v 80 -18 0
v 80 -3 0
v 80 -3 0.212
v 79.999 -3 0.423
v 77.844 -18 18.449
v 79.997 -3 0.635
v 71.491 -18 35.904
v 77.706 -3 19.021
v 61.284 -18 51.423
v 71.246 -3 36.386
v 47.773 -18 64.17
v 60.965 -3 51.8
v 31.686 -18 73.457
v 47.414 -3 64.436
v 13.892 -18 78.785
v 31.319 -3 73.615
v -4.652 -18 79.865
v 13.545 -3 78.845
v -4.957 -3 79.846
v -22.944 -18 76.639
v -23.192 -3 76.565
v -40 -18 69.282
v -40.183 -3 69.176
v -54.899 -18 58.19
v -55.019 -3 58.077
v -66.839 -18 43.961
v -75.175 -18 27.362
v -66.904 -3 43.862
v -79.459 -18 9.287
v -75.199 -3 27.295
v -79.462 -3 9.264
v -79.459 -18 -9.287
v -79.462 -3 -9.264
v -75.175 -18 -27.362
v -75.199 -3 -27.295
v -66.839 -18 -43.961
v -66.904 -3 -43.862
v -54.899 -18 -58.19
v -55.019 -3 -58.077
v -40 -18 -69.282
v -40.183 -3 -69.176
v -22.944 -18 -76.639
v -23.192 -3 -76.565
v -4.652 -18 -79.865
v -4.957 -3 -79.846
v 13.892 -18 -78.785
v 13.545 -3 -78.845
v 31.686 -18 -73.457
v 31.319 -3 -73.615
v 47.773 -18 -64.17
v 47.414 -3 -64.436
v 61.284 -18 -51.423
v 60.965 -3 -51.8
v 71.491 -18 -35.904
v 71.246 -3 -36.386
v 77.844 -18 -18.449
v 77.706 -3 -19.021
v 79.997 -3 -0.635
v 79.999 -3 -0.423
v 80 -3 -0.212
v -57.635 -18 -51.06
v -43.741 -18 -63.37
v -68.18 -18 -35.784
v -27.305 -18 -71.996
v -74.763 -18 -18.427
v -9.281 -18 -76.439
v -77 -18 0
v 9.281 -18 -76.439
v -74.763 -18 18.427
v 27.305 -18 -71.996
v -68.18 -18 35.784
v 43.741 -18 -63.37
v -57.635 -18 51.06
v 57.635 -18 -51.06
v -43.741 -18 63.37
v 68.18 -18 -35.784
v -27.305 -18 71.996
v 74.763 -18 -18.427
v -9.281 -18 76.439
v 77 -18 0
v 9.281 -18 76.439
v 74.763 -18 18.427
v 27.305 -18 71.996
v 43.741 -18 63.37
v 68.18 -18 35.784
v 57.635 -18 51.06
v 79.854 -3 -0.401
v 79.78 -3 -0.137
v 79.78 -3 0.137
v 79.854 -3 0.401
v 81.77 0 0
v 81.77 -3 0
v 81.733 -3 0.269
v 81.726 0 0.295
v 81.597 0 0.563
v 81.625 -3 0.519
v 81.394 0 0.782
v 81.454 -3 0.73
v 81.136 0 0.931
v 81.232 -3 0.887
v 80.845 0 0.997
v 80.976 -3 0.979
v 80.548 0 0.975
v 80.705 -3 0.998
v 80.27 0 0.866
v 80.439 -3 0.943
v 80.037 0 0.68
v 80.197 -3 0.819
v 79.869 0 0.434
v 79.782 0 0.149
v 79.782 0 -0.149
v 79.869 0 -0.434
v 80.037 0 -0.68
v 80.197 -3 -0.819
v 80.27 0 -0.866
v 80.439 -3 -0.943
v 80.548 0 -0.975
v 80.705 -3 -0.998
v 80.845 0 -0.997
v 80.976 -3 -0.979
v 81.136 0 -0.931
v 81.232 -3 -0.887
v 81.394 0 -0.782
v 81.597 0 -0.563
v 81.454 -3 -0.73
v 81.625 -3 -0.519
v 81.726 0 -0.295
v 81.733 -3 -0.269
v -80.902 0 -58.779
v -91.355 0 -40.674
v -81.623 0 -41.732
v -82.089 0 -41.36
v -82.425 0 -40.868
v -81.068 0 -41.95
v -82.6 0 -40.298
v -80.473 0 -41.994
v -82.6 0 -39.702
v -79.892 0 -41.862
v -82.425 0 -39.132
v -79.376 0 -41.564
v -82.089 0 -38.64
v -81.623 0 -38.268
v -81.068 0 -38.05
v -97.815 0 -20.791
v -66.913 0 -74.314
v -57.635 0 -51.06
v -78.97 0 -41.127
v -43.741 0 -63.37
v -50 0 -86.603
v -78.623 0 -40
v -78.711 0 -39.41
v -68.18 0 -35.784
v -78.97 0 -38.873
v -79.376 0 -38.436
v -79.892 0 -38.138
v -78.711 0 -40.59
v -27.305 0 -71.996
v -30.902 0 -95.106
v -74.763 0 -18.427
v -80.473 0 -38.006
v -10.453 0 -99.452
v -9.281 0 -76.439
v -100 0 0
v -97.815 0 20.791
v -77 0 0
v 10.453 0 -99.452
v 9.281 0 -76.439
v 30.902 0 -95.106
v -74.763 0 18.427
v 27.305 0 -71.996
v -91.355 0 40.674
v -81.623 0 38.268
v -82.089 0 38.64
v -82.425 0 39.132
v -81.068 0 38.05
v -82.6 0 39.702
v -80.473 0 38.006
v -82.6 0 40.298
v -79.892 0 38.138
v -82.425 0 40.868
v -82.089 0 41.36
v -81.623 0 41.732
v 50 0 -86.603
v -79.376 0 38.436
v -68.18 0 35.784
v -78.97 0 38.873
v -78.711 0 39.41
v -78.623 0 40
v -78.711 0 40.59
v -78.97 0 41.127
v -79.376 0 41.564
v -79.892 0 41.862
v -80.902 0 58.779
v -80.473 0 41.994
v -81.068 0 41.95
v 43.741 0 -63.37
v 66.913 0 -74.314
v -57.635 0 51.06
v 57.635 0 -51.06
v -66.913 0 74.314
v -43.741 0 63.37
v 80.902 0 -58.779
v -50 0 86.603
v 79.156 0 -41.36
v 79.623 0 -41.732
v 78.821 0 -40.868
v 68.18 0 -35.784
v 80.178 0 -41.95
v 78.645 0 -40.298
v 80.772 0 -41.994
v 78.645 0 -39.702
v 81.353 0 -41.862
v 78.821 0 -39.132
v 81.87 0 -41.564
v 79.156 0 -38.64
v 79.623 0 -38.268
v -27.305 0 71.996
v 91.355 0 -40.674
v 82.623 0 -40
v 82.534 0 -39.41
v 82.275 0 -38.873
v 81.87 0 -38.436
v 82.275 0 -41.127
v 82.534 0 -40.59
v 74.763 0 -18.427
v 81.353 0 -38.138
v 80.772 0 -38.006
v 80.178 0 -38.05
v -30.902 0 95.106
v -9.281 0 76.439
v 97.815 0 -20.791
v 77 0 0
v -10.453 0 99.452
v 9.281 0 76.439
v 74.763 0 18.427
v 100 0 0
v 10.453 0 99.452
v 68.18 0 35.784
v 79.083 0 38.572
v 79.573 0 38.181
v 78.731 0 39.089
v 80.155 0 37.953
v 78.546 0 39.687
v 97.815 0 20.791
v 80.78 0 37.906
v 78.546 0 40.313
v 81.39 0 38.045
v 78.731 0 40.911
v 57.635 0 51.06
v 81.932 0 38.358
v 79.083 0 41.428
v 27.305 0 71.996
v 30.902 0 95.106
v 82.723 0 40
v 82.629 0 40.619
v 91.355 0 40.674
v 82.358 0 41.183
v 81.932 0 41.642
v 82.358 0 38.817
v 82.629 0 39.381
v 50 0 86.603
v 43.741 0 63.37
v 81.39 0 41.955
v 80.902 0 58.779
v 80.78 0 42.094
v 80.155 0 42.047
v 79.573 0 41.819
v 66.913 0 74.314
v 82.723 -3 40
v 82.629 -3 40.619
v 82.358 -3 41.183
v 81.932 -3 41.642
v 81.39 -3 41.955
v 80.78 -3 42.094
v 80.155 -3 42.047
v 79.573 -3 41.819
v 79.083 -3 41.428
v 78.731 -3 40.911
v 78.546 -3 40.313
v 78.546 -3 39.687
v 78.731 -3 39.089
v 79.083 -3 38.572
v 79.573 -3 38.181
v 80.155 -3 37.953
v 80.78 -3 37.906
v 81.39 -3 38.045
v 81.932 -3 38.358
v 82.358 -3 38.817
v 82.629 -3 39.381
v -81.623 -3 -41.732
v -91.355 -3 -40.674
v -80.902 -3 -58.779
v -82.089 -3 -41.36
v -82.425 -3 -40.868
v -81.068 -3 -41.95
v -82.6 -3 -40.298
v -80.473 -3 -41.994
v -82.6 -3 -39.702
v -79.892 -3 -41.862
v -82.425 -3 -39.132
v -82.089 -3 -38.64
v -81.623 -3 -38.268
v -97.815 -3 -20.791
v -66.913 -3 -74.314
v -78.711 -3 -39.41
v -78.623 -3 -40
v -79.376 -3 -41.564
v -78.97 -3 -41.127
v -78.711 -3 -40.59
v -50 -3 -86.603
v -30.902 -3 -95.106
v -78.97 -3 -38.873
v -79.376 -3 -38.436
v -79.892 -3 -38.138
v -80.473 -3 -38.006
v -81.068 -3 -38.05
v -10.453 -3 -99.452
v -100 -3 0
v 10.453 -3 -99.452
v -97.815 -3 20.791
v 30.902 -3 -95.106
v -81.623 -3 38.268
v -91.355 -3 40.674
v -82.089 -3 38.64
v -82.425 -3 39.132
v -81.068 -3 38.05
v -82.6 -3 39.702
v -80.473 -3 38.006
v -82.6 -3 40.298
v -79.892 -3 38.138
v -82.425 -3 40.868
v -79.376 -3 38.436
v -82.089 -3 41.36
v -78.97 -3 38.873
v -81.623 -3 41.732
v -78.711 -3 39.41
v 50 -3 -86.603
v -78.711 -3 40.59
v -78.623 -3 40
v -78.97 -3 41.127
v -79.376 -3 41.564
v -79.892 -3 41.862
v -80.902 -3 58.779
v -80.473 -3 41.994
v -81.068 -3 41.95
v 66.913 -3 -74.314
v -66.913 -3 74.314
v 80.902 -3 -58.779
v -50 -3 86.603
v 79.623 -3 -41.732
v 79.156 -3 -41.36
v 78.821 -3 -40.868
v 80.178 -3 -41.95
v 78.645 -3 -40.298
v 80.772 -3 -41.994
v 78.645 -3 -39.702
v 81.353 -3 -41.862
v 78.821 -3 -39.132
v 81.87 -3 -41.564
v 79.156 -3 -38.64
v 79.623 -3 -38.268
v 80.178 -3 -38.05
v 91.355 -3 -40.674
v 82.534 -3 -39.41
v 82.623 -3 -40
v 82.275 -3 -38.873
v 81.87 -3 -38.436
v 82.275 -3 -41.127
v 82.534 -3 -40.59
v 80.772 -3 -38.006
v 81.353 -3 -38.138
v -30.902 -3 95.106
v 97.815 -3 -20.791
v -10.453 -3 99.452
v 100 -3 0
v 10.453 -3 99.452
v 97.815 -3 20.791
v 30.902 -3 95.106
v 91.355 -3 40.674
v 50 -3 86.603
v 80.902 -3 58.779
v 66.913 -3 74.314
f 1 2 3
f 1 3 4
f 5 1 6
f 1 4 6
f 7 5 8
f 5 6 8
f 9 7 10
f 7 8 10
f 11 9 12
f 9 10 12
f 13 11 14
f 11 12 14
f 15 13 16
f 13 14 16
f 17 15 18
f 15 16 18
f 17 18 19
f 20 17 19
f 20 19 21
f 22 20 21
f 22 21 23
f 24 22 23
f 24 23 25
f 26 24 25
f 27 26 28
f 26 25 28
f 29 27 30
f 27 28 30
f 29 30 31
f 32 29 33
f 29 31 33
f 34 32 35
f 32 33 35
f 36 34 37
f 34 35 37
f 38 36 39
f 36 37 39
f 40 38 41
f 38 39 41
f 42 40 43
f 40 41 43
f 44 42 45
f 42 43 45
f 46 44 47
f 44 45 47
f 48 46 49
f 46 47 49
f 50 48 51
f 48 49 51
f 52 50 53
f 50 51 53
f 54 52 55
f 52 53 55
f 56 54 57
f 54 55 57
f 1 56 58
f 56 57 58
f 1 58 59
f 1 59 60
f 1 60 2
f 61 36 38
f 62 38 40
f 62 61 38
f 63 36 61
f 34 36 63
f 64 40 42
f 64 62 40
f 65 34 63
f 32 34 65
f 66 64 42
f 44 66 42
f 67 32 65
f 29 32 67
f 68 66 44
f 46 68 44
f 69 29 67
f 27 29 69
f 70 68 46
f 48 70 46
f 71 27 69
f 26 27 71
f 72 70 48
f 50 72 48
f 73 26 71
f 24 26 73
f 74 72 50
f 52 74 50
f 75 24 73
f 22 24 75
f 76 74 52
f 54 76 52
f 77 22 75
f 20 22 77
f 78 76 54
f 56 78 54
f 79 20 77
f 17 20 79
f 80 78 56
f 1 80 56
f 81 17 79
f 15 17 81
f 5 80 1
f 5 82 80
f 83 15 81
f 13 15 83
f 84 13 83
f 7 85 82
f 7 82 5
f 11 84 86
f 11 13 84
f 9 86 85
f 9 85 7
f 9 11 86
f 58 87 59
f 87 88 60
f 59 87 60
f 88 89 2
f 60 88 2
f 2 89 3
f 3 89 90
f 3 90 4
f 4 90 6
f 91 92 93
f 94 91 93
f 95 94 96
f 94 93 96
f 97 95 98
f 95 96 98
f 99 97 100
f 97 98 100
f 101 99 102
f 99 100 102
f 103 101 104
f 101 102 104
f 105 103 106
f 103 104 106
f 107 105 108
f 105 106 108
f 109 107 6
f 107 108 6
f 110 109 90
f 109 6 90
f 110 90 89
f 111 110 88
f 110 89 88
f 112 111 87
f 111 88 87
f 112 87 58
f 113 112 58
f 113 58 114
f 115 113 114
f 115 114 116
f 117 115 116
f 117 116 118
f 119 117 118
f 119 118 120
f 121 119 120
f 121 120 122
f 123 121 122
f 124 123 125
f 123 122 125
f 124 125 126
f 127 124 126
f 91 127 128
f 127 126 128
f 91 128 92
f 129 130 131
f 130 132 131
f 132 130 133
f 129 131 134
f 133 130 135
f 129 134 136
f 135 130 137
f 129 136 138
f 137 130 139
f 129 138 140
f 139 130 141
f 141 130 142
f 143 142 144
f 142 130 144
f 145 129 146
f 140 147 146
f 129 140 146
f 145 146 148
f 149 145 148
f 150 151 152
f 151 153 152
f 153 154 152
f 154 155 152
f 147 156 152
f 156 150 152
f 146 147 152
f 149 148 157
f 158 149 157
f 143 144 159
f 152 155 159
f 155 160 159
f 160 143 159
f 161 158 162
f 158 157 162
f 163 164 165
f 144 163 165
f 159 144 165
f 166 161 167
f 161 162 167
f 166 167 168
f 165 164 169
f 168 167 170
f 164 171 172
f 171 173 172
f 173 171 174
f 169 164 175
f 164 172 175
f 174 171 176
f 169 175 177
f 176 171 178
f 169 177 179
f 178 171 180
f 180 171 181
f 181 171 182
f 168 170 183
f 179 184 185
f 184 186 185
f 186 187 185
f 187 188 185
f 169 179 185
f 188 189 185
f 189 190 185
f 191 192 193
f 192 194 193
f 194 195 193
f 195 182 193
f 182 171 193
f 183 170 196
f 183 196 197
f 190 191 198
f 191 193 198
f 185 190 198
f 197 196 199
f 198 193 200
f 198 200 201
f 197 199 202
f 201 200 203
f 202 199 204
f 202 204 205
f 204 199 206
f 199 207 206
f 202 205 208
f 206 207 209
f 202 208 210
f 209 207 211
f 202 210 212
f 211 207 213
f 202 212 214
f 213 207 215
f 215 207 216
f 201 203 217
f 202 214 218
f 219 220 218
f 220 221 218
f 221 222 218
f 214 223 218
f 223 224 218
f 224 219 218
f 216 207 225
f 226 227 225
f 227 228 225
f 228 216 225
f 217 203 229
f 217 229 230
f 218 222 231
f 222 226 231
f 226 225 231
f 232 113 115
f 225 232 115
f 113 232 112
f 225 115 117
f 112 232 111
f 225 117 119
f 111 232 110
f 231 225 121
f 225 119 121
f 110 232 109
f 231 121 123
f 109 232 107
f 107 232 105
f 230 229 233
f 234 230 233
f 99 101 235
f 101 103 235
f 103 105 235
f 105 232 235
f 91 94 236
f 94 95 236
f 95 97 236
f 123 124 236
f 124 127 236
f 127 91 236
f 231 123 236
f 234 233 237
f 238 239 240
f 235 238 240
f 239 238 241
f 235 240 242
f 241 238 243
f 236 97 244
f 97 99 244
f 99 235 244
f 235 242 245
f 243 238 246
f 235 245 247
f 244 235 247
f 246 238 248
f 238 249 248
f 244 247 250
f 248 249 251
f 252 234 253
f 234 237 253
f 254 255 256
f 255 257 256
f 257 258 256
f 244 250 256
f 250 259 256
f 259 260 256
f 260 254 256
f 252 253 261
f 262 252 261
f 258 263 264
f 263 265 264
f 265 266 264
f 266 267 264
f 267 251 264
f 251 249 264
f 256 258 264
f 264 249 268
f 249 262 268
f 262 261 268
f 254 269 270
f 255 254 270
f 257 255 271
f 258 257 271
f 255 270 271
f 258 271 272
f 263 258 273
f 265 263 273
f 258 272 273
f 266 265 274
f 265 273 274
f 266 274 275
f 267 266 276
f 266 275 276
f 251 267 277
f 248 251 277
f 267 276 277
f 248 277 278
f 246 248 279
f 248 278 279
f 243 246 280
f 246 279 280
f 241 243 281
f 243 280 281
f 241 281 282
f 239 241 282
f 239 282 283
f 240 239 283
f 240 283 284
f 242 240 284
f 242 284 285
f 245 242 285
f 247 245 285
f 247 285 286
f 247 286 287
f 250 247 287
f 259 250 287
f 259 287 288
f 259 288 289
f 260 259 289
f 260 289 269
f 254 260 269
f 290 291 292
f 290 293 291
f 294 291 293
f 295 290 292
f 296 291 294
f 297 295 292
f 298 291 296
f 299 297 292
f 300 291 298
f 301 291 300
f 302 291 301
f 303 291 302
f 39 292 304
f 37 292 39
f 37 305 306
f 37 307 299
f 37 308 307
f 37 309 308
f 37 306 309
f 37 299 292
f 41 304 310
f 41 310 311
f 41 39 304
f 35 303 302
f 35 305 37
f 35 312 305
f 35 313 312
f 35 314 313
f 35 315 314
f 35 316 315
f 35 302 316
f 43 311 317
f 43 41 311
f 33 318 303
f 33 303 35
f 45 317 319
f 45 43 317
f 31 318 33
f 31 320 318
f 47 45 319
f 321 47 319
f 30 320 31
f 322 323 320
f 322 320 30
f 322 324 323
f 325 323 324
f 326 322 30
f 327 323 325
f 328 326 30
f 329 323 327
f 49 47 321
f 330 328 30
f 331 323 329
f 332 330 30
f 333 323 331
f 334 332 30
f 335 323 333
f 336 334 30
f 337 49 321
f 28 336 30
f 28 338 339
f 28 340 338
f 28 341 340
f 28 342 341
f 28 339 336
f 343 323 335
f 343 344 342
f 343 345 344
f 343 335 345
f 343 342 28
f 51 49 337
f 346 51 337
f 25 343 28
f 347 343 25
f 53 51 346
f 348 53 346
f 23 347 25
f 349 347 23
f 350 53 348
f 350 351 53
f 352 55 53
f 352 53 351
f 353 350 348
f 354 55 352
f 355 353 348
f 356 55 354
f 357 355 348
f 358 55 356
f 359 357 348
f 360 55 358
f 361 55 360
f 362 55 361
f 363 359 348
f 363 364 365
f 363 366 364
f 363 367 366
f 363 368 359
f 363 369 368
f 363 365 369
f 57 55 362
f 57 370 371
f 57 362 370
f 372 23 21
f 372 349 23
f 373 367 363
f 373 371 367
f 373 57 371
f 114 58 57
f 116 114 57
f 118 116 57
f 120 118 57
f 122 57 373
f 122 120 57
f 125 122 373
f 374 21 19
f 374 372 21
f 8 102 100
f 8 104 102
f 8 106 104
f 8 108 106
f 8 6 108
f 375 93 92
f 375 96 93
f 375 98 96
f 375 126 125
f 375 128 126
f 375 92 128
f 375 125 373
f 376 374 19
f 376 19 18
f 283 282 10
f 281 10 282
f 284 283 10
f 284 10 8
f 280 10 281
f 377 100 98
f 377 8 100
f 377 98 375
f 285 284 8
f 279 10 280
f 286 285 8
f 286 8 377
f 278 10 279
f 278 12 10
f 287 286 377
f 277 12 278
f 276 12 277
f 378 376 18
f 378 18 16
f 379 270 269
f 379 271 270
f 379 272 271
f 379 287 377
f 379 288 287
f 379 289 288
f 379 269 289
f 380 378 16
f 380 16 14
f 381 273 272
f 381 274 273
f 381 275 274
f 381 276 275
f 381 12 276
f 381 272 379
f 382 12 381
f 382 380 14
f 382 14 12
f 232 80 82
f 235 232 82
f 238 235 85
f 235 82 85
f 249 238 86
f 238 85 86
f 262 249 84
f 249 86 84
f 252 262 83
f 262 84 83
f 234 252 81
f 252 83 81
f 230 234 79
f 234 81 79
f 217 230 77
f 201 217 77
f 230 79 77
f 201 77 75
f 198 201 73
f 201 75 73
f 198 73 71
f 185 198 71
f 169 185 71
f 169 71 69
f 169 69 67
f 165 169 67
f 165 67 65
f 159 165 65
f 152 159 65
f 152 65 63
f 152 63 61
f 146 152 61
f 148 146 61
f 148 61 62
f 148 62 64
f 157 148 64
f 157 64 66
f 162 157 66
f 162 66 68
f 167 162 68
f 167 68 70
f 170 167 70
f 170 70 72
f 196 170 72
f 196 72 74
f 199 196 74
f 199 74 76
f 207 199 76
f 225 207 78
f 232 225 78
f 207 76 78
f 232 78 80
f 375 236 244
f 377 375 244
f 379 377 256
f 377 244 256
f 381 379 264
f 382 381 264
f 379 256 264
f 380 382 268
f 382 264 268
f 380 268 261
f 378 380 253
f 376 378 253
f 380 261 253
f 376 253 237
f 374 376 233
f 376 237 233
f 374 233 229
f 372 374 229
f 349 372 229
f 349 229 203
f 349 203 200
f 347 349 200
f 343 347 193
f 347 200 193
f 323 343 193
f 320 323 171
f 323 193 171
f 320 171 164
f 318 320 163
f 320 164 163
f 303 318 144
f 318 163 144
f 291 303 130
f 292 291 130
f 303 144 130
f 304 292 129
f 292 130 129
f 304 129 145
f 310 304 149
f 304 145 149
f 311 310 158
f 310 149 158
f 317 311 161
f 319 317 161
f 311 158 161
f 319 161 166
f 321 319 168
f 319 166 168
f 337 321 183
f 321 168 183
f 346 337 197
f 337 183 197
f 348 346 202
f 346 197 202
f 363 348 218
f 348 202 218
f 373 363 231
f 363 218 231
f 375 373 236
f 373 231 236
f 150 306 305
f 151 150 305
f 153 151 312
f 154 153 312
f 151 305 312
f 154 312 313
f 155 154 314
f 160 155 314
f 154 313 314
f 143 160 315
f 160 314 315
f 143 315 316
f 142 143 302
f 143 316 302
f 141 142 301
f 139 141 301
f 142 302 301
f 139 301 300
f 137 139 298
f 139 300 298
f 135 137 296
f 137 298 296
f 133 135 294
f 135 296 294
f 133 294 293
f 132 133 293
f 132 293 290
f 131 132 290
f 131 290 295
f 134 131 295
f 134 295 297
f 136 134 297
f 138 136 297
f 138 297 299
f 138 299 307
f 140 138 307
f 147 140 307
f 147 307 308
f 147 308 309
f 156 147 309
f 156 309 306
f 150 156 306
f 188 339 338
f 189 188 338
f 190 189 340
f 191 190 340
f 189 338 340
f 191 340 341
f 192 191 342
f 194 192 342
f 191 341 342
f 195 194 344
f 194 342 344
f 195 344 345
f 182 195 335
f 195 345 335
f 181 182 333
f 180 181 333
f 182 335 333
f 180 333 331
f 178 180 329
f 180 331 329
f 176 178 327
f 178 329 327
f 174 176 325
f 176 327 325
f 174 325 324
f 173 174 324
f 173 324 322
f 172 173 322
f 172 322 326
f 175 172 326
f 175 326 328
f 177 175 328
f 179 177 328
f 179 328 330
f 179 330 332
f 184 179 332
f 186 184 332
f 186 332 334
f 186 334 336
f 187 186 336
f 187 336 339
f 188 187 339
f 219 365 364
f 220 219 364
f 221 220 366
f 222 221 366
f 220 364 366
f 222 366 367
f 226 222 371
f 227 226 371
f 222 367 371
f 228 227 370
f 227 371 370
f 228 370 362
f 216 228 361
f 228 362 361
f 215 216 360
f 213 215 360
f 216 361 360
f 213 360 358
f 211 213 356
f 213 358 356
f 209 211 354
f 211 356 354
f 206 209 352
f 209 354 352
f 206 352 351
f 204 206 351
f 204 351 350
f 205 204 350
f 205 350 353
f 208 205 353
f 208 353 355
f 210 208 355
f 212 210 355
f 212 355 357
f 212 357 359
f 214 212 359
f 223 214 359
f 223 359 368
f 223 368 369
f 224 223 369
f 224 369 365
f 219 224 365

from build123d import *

# Parameters (mm, degrees)
F0_R     = 100
F1_DEPTH = 3
F2_R     = 80
F3_DEPTH = 15
F4_R     = 77
F5_DEPTH = 18.001
F6_R     = 2.1
F6_R_2   = 2
F6_R_3   = 1
F7_DEPTH = 3.001


with BuildPart() as f1:
    # F0 (on Front) → F1 (new body)
    with BuildSketch(Plane.XZ):
        Circle(F0_R)
    extrude(amount=F1_DEPTH)

    # F2 (on face) → F3 (join)
    with BuildSketch(Plane.XZ.offset(3)):
        Circle(F2_R)
    extrude(amount=F3_DEPTH)

    # F4 (on face) → F5 (cut, through all)
    with BuildSketch(Plane.XZ.offset(18)):
        Circle(F4_R)
    extrude(amount=-F5_DEPTH, mode=Mode.SUBTRACT)

    # F6 (on face) → F7 (cut, through all)
    with BuildSketch(Plane.XZ.offset(3)):
        with Locations((80.622577, 40)):
            Circle(F6_R)
        with Locations((-80.622577, 40)):
            Circle(F6_R_2)
        with Locations((-80.622577, -40)):
            Circle(F6_R_2)
        with Locations((80.622577, -40)):
            Circle(F6_R_2)
        with Locations((80.770344, 0)):
            Circle(F6_R_3)
    extrude(amount=-F7_DEPTH, mode=Mode.SUBTRACT)


solid = f1.part
